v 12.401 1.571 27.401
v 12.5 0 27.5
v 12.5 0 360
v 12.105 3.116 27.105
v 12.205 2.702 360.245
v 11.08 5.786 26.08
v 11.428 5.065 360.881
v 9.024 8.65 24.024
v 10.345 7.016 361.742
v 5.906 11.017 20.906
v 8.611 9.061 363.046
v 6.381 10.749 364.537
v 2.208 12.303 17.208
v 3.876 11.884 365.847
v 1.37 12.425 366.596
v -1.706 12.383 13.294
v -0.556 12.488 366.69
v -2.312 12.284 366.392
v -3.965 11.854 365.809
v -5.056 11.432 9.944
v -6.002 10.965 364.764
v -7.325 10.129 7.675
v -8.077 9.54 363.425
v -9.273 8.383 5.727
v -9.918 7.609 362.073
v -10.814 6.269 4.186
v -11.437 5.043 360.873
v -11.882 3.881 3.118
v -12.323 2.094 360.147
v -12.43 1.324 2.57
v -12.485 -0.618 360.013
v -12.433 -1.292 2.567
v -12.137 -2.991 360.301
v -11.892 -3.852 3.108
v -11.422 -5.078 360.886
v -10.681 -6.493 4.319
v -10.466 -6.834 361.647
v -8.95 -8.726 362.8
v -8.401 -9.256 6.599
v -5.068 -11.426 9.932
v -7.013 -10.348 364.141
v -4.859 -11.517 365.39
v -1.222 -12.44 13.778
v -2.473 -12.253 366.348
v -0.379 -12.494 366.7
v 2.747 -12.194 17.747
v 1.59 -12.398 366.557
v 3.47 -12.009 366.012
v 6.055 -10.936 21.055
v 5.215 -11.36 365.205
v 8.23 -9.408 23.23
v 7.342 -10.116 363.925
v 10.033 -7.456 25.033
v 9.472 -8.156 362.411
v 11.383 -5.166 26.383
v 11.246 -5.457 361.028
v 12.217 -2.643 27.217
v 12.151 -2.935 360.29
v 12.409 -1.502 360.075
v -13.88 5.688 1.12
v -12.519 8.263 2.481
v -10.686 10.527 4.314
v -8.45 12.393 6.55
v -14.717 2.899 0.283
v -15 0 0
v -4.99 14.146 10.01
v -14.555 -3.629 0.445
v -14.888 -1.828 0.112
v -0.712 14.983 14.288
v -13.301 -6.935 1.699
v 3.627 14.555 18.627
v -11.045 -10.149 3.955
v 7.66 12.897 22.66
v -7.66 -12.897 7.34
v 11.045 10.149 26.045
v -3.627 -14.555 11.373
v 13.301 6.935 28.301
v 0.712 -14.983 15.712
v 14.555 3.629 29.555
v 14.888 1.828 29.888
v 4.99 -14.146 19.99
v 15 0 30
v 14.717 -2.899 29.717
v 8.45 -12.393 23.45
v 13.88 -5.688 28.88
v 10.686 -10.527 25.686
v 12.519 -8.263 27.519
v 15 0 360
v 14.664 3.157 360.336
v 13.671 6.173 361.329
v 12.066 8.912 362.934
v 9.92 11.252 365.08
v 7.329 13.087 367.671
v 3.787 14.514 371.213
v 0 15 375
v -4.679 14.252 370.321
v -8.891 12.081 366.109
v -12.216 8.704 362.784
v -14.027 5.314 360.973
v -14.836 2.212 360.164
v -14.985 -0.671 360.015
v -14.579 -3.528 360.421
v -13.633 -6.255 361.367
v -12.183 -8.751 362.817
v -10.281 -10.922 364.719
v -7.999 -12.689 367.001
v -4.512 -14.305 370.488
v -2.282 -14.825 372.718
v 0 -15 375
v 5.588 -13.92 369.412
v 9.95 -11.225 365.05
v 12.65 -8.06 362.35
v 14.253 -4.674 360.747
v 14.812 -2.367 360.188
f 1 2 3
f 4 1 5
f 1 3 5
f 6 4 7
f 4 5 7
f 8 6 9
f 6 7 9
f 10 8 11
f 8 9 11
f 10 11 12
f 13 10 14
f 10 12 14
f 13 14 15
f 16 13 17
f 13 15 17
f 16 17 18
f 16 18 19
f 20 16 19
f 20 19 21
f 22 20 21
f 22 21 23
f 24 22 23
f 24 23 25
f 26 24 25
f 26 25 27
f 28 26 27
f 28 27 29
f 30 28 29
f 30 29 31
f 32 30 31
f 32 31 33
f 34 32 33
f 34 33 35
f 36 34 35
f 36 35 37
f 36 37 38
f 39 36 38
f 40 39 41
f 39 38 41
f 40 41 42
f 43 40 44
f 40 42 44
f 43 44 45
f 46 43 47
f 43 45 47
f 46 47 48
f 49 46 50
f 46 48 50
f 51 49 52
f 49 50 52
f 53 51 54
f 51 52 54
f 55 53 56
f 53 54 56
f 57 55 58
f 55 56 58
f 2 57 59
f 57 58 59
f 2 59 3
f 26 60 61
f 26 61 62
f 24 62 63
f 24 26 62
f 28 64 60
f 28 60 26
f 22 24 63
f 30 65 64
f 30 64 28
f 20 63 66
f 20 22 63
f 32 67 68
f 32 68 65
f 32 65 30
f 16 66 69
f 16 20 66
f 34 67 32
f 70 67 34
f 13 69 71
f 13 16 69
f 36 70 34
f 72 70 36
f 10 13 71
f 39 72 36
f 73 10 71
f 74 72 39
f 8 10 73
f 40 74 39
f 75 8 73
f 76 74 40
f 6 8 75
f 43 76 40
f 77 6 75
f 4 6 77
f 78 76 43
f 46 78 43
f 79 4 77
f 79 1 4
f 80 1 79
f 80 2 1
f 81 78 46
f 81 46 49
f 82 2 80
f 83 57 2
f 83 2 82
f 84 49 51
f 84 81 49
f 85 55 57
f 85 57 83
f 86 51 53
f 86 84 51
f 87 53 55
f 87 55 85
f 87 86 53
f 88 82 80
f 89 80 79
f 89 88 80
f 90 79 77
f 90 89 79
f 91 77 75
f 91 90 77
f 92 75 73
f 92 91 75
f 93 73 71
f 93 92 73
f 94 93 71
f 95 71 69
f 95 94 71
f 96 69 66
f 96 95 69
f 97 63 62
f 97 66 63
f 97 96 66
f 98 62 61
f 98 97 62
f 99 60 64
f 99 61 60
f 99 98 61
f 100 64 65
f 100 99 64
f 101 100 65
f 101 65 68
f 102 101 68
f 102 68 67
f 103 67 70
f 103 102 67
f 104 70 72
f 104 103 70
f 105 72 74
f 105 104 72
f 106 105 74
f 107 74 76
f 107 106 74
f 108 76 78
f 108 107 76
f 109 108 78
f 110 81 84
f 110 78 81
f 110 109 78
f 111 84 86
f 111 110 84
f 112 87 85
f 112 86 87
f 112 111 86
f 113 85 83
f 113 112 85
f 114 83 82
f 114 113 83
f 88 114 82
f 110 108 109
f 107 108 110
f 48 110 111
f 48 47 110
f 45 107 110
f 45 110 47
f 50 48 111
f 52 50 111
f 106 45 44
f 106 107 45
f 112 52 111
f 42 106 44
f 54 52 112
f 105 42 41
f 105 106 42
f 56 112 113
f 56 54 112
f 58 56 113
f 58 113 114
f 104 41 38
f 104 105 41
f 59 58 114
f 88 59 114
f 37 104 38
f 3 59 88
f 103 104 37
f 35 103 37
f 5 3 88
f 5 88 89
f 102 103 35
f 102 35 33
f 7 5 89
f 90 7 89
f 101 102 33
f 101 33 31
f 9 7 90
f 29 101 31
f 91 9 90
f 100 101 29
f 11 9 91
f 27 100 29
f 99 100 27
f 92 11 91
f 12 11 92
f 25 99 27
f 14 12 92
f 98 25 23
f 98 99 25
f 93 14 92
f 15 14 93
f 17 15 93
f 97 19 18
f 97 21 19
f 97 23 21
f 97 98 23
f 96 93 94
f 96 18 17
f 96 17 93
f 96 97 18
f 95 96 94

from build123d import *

# Parameters (mm, degrees)
SKETCH_2_R               = 15
SKETCH_3_R               = 12.5
CUT_EXTRUDE_1_DEPTH      = 376.599520766
CUT_EXTRUDE_2_DEPTH      = 376.599520766
CUT_EXTRUDE_2_DEPTH_BACK = 376.599520766
CUT_EXTRUDE_4_DEPTH      = 376.599520766
CUT_EXTRUDE_4_DEPTH_BACK = 376.599520766


with BuildPart() as part:
    # По траектории1: sweep along a path in Эскиз1
    with BuildLine(Plane(origin=(0, 0, 0), x_dir=(1, 0, 0), z_dir=(0, 1, 0))) as sweep_1_path:
        Line((0, 0), (0, -375))
    # Эскиз2 → По траектории1 (sweep)
    with BuildSketch(Plane.XY):
        Circle(SKETCH_2_R)
    sweep(path=sweep_1_path.line)

    # Эскиз3 → Вырез-Вытянуть1 (cut, through all)
    with BuildSketch(Plane.XY.offset(375)):
        Circle(SKETCH_3_R)
    extrude(amount=-CUT_EXTRUDE_1_DEPTH, mode=Mode.SUBTRACT)

    # Эскиз4 → Вырез-Вытянуть2 (cut, two sides: drawn at the far end of the back side and taken through both)
    with BuildSketch(Plane(origin=(0, 0, 0), x_dir=(1, 0, 0), z_dir=(0, 1, 0)).offset(-CUT_EXTRUDE_2_DEPTH_BACK)):
        Polygon((-15, 0), (15, -30), (15, 0), align=None)
    extrude(amount=CUT_EXTRUDE_2_DEPTH + CUT_EXTRUDE_2_DEPTH_BACK, mode=Mode.SUBTRACT)

    # Эскиз5 → Вырез-Вытянуть4 (cut, two sides: drawn at the far end of the back side and taken through both)
    with BuildSketch(Plane(origin=(0, 0, 0), x_dir=(0, 0, -1), z_dir=(1, 0, 0)).offset(-CUT_EXTRUDE_4_DEPTH_BACK)):
        with BuildLine():
            Line((-375, 15), (-375, -15))
            ThreePointArc((-375, -15), (-360, 0), (-375, 15))
        make_face()
    extrude(amount=CUT_EXTRUDE_4_DEPTH + CUT_EXTRUDE_4_DEPTH_BACK, mode=Mode.SUBTRACT)


solid = part.part
